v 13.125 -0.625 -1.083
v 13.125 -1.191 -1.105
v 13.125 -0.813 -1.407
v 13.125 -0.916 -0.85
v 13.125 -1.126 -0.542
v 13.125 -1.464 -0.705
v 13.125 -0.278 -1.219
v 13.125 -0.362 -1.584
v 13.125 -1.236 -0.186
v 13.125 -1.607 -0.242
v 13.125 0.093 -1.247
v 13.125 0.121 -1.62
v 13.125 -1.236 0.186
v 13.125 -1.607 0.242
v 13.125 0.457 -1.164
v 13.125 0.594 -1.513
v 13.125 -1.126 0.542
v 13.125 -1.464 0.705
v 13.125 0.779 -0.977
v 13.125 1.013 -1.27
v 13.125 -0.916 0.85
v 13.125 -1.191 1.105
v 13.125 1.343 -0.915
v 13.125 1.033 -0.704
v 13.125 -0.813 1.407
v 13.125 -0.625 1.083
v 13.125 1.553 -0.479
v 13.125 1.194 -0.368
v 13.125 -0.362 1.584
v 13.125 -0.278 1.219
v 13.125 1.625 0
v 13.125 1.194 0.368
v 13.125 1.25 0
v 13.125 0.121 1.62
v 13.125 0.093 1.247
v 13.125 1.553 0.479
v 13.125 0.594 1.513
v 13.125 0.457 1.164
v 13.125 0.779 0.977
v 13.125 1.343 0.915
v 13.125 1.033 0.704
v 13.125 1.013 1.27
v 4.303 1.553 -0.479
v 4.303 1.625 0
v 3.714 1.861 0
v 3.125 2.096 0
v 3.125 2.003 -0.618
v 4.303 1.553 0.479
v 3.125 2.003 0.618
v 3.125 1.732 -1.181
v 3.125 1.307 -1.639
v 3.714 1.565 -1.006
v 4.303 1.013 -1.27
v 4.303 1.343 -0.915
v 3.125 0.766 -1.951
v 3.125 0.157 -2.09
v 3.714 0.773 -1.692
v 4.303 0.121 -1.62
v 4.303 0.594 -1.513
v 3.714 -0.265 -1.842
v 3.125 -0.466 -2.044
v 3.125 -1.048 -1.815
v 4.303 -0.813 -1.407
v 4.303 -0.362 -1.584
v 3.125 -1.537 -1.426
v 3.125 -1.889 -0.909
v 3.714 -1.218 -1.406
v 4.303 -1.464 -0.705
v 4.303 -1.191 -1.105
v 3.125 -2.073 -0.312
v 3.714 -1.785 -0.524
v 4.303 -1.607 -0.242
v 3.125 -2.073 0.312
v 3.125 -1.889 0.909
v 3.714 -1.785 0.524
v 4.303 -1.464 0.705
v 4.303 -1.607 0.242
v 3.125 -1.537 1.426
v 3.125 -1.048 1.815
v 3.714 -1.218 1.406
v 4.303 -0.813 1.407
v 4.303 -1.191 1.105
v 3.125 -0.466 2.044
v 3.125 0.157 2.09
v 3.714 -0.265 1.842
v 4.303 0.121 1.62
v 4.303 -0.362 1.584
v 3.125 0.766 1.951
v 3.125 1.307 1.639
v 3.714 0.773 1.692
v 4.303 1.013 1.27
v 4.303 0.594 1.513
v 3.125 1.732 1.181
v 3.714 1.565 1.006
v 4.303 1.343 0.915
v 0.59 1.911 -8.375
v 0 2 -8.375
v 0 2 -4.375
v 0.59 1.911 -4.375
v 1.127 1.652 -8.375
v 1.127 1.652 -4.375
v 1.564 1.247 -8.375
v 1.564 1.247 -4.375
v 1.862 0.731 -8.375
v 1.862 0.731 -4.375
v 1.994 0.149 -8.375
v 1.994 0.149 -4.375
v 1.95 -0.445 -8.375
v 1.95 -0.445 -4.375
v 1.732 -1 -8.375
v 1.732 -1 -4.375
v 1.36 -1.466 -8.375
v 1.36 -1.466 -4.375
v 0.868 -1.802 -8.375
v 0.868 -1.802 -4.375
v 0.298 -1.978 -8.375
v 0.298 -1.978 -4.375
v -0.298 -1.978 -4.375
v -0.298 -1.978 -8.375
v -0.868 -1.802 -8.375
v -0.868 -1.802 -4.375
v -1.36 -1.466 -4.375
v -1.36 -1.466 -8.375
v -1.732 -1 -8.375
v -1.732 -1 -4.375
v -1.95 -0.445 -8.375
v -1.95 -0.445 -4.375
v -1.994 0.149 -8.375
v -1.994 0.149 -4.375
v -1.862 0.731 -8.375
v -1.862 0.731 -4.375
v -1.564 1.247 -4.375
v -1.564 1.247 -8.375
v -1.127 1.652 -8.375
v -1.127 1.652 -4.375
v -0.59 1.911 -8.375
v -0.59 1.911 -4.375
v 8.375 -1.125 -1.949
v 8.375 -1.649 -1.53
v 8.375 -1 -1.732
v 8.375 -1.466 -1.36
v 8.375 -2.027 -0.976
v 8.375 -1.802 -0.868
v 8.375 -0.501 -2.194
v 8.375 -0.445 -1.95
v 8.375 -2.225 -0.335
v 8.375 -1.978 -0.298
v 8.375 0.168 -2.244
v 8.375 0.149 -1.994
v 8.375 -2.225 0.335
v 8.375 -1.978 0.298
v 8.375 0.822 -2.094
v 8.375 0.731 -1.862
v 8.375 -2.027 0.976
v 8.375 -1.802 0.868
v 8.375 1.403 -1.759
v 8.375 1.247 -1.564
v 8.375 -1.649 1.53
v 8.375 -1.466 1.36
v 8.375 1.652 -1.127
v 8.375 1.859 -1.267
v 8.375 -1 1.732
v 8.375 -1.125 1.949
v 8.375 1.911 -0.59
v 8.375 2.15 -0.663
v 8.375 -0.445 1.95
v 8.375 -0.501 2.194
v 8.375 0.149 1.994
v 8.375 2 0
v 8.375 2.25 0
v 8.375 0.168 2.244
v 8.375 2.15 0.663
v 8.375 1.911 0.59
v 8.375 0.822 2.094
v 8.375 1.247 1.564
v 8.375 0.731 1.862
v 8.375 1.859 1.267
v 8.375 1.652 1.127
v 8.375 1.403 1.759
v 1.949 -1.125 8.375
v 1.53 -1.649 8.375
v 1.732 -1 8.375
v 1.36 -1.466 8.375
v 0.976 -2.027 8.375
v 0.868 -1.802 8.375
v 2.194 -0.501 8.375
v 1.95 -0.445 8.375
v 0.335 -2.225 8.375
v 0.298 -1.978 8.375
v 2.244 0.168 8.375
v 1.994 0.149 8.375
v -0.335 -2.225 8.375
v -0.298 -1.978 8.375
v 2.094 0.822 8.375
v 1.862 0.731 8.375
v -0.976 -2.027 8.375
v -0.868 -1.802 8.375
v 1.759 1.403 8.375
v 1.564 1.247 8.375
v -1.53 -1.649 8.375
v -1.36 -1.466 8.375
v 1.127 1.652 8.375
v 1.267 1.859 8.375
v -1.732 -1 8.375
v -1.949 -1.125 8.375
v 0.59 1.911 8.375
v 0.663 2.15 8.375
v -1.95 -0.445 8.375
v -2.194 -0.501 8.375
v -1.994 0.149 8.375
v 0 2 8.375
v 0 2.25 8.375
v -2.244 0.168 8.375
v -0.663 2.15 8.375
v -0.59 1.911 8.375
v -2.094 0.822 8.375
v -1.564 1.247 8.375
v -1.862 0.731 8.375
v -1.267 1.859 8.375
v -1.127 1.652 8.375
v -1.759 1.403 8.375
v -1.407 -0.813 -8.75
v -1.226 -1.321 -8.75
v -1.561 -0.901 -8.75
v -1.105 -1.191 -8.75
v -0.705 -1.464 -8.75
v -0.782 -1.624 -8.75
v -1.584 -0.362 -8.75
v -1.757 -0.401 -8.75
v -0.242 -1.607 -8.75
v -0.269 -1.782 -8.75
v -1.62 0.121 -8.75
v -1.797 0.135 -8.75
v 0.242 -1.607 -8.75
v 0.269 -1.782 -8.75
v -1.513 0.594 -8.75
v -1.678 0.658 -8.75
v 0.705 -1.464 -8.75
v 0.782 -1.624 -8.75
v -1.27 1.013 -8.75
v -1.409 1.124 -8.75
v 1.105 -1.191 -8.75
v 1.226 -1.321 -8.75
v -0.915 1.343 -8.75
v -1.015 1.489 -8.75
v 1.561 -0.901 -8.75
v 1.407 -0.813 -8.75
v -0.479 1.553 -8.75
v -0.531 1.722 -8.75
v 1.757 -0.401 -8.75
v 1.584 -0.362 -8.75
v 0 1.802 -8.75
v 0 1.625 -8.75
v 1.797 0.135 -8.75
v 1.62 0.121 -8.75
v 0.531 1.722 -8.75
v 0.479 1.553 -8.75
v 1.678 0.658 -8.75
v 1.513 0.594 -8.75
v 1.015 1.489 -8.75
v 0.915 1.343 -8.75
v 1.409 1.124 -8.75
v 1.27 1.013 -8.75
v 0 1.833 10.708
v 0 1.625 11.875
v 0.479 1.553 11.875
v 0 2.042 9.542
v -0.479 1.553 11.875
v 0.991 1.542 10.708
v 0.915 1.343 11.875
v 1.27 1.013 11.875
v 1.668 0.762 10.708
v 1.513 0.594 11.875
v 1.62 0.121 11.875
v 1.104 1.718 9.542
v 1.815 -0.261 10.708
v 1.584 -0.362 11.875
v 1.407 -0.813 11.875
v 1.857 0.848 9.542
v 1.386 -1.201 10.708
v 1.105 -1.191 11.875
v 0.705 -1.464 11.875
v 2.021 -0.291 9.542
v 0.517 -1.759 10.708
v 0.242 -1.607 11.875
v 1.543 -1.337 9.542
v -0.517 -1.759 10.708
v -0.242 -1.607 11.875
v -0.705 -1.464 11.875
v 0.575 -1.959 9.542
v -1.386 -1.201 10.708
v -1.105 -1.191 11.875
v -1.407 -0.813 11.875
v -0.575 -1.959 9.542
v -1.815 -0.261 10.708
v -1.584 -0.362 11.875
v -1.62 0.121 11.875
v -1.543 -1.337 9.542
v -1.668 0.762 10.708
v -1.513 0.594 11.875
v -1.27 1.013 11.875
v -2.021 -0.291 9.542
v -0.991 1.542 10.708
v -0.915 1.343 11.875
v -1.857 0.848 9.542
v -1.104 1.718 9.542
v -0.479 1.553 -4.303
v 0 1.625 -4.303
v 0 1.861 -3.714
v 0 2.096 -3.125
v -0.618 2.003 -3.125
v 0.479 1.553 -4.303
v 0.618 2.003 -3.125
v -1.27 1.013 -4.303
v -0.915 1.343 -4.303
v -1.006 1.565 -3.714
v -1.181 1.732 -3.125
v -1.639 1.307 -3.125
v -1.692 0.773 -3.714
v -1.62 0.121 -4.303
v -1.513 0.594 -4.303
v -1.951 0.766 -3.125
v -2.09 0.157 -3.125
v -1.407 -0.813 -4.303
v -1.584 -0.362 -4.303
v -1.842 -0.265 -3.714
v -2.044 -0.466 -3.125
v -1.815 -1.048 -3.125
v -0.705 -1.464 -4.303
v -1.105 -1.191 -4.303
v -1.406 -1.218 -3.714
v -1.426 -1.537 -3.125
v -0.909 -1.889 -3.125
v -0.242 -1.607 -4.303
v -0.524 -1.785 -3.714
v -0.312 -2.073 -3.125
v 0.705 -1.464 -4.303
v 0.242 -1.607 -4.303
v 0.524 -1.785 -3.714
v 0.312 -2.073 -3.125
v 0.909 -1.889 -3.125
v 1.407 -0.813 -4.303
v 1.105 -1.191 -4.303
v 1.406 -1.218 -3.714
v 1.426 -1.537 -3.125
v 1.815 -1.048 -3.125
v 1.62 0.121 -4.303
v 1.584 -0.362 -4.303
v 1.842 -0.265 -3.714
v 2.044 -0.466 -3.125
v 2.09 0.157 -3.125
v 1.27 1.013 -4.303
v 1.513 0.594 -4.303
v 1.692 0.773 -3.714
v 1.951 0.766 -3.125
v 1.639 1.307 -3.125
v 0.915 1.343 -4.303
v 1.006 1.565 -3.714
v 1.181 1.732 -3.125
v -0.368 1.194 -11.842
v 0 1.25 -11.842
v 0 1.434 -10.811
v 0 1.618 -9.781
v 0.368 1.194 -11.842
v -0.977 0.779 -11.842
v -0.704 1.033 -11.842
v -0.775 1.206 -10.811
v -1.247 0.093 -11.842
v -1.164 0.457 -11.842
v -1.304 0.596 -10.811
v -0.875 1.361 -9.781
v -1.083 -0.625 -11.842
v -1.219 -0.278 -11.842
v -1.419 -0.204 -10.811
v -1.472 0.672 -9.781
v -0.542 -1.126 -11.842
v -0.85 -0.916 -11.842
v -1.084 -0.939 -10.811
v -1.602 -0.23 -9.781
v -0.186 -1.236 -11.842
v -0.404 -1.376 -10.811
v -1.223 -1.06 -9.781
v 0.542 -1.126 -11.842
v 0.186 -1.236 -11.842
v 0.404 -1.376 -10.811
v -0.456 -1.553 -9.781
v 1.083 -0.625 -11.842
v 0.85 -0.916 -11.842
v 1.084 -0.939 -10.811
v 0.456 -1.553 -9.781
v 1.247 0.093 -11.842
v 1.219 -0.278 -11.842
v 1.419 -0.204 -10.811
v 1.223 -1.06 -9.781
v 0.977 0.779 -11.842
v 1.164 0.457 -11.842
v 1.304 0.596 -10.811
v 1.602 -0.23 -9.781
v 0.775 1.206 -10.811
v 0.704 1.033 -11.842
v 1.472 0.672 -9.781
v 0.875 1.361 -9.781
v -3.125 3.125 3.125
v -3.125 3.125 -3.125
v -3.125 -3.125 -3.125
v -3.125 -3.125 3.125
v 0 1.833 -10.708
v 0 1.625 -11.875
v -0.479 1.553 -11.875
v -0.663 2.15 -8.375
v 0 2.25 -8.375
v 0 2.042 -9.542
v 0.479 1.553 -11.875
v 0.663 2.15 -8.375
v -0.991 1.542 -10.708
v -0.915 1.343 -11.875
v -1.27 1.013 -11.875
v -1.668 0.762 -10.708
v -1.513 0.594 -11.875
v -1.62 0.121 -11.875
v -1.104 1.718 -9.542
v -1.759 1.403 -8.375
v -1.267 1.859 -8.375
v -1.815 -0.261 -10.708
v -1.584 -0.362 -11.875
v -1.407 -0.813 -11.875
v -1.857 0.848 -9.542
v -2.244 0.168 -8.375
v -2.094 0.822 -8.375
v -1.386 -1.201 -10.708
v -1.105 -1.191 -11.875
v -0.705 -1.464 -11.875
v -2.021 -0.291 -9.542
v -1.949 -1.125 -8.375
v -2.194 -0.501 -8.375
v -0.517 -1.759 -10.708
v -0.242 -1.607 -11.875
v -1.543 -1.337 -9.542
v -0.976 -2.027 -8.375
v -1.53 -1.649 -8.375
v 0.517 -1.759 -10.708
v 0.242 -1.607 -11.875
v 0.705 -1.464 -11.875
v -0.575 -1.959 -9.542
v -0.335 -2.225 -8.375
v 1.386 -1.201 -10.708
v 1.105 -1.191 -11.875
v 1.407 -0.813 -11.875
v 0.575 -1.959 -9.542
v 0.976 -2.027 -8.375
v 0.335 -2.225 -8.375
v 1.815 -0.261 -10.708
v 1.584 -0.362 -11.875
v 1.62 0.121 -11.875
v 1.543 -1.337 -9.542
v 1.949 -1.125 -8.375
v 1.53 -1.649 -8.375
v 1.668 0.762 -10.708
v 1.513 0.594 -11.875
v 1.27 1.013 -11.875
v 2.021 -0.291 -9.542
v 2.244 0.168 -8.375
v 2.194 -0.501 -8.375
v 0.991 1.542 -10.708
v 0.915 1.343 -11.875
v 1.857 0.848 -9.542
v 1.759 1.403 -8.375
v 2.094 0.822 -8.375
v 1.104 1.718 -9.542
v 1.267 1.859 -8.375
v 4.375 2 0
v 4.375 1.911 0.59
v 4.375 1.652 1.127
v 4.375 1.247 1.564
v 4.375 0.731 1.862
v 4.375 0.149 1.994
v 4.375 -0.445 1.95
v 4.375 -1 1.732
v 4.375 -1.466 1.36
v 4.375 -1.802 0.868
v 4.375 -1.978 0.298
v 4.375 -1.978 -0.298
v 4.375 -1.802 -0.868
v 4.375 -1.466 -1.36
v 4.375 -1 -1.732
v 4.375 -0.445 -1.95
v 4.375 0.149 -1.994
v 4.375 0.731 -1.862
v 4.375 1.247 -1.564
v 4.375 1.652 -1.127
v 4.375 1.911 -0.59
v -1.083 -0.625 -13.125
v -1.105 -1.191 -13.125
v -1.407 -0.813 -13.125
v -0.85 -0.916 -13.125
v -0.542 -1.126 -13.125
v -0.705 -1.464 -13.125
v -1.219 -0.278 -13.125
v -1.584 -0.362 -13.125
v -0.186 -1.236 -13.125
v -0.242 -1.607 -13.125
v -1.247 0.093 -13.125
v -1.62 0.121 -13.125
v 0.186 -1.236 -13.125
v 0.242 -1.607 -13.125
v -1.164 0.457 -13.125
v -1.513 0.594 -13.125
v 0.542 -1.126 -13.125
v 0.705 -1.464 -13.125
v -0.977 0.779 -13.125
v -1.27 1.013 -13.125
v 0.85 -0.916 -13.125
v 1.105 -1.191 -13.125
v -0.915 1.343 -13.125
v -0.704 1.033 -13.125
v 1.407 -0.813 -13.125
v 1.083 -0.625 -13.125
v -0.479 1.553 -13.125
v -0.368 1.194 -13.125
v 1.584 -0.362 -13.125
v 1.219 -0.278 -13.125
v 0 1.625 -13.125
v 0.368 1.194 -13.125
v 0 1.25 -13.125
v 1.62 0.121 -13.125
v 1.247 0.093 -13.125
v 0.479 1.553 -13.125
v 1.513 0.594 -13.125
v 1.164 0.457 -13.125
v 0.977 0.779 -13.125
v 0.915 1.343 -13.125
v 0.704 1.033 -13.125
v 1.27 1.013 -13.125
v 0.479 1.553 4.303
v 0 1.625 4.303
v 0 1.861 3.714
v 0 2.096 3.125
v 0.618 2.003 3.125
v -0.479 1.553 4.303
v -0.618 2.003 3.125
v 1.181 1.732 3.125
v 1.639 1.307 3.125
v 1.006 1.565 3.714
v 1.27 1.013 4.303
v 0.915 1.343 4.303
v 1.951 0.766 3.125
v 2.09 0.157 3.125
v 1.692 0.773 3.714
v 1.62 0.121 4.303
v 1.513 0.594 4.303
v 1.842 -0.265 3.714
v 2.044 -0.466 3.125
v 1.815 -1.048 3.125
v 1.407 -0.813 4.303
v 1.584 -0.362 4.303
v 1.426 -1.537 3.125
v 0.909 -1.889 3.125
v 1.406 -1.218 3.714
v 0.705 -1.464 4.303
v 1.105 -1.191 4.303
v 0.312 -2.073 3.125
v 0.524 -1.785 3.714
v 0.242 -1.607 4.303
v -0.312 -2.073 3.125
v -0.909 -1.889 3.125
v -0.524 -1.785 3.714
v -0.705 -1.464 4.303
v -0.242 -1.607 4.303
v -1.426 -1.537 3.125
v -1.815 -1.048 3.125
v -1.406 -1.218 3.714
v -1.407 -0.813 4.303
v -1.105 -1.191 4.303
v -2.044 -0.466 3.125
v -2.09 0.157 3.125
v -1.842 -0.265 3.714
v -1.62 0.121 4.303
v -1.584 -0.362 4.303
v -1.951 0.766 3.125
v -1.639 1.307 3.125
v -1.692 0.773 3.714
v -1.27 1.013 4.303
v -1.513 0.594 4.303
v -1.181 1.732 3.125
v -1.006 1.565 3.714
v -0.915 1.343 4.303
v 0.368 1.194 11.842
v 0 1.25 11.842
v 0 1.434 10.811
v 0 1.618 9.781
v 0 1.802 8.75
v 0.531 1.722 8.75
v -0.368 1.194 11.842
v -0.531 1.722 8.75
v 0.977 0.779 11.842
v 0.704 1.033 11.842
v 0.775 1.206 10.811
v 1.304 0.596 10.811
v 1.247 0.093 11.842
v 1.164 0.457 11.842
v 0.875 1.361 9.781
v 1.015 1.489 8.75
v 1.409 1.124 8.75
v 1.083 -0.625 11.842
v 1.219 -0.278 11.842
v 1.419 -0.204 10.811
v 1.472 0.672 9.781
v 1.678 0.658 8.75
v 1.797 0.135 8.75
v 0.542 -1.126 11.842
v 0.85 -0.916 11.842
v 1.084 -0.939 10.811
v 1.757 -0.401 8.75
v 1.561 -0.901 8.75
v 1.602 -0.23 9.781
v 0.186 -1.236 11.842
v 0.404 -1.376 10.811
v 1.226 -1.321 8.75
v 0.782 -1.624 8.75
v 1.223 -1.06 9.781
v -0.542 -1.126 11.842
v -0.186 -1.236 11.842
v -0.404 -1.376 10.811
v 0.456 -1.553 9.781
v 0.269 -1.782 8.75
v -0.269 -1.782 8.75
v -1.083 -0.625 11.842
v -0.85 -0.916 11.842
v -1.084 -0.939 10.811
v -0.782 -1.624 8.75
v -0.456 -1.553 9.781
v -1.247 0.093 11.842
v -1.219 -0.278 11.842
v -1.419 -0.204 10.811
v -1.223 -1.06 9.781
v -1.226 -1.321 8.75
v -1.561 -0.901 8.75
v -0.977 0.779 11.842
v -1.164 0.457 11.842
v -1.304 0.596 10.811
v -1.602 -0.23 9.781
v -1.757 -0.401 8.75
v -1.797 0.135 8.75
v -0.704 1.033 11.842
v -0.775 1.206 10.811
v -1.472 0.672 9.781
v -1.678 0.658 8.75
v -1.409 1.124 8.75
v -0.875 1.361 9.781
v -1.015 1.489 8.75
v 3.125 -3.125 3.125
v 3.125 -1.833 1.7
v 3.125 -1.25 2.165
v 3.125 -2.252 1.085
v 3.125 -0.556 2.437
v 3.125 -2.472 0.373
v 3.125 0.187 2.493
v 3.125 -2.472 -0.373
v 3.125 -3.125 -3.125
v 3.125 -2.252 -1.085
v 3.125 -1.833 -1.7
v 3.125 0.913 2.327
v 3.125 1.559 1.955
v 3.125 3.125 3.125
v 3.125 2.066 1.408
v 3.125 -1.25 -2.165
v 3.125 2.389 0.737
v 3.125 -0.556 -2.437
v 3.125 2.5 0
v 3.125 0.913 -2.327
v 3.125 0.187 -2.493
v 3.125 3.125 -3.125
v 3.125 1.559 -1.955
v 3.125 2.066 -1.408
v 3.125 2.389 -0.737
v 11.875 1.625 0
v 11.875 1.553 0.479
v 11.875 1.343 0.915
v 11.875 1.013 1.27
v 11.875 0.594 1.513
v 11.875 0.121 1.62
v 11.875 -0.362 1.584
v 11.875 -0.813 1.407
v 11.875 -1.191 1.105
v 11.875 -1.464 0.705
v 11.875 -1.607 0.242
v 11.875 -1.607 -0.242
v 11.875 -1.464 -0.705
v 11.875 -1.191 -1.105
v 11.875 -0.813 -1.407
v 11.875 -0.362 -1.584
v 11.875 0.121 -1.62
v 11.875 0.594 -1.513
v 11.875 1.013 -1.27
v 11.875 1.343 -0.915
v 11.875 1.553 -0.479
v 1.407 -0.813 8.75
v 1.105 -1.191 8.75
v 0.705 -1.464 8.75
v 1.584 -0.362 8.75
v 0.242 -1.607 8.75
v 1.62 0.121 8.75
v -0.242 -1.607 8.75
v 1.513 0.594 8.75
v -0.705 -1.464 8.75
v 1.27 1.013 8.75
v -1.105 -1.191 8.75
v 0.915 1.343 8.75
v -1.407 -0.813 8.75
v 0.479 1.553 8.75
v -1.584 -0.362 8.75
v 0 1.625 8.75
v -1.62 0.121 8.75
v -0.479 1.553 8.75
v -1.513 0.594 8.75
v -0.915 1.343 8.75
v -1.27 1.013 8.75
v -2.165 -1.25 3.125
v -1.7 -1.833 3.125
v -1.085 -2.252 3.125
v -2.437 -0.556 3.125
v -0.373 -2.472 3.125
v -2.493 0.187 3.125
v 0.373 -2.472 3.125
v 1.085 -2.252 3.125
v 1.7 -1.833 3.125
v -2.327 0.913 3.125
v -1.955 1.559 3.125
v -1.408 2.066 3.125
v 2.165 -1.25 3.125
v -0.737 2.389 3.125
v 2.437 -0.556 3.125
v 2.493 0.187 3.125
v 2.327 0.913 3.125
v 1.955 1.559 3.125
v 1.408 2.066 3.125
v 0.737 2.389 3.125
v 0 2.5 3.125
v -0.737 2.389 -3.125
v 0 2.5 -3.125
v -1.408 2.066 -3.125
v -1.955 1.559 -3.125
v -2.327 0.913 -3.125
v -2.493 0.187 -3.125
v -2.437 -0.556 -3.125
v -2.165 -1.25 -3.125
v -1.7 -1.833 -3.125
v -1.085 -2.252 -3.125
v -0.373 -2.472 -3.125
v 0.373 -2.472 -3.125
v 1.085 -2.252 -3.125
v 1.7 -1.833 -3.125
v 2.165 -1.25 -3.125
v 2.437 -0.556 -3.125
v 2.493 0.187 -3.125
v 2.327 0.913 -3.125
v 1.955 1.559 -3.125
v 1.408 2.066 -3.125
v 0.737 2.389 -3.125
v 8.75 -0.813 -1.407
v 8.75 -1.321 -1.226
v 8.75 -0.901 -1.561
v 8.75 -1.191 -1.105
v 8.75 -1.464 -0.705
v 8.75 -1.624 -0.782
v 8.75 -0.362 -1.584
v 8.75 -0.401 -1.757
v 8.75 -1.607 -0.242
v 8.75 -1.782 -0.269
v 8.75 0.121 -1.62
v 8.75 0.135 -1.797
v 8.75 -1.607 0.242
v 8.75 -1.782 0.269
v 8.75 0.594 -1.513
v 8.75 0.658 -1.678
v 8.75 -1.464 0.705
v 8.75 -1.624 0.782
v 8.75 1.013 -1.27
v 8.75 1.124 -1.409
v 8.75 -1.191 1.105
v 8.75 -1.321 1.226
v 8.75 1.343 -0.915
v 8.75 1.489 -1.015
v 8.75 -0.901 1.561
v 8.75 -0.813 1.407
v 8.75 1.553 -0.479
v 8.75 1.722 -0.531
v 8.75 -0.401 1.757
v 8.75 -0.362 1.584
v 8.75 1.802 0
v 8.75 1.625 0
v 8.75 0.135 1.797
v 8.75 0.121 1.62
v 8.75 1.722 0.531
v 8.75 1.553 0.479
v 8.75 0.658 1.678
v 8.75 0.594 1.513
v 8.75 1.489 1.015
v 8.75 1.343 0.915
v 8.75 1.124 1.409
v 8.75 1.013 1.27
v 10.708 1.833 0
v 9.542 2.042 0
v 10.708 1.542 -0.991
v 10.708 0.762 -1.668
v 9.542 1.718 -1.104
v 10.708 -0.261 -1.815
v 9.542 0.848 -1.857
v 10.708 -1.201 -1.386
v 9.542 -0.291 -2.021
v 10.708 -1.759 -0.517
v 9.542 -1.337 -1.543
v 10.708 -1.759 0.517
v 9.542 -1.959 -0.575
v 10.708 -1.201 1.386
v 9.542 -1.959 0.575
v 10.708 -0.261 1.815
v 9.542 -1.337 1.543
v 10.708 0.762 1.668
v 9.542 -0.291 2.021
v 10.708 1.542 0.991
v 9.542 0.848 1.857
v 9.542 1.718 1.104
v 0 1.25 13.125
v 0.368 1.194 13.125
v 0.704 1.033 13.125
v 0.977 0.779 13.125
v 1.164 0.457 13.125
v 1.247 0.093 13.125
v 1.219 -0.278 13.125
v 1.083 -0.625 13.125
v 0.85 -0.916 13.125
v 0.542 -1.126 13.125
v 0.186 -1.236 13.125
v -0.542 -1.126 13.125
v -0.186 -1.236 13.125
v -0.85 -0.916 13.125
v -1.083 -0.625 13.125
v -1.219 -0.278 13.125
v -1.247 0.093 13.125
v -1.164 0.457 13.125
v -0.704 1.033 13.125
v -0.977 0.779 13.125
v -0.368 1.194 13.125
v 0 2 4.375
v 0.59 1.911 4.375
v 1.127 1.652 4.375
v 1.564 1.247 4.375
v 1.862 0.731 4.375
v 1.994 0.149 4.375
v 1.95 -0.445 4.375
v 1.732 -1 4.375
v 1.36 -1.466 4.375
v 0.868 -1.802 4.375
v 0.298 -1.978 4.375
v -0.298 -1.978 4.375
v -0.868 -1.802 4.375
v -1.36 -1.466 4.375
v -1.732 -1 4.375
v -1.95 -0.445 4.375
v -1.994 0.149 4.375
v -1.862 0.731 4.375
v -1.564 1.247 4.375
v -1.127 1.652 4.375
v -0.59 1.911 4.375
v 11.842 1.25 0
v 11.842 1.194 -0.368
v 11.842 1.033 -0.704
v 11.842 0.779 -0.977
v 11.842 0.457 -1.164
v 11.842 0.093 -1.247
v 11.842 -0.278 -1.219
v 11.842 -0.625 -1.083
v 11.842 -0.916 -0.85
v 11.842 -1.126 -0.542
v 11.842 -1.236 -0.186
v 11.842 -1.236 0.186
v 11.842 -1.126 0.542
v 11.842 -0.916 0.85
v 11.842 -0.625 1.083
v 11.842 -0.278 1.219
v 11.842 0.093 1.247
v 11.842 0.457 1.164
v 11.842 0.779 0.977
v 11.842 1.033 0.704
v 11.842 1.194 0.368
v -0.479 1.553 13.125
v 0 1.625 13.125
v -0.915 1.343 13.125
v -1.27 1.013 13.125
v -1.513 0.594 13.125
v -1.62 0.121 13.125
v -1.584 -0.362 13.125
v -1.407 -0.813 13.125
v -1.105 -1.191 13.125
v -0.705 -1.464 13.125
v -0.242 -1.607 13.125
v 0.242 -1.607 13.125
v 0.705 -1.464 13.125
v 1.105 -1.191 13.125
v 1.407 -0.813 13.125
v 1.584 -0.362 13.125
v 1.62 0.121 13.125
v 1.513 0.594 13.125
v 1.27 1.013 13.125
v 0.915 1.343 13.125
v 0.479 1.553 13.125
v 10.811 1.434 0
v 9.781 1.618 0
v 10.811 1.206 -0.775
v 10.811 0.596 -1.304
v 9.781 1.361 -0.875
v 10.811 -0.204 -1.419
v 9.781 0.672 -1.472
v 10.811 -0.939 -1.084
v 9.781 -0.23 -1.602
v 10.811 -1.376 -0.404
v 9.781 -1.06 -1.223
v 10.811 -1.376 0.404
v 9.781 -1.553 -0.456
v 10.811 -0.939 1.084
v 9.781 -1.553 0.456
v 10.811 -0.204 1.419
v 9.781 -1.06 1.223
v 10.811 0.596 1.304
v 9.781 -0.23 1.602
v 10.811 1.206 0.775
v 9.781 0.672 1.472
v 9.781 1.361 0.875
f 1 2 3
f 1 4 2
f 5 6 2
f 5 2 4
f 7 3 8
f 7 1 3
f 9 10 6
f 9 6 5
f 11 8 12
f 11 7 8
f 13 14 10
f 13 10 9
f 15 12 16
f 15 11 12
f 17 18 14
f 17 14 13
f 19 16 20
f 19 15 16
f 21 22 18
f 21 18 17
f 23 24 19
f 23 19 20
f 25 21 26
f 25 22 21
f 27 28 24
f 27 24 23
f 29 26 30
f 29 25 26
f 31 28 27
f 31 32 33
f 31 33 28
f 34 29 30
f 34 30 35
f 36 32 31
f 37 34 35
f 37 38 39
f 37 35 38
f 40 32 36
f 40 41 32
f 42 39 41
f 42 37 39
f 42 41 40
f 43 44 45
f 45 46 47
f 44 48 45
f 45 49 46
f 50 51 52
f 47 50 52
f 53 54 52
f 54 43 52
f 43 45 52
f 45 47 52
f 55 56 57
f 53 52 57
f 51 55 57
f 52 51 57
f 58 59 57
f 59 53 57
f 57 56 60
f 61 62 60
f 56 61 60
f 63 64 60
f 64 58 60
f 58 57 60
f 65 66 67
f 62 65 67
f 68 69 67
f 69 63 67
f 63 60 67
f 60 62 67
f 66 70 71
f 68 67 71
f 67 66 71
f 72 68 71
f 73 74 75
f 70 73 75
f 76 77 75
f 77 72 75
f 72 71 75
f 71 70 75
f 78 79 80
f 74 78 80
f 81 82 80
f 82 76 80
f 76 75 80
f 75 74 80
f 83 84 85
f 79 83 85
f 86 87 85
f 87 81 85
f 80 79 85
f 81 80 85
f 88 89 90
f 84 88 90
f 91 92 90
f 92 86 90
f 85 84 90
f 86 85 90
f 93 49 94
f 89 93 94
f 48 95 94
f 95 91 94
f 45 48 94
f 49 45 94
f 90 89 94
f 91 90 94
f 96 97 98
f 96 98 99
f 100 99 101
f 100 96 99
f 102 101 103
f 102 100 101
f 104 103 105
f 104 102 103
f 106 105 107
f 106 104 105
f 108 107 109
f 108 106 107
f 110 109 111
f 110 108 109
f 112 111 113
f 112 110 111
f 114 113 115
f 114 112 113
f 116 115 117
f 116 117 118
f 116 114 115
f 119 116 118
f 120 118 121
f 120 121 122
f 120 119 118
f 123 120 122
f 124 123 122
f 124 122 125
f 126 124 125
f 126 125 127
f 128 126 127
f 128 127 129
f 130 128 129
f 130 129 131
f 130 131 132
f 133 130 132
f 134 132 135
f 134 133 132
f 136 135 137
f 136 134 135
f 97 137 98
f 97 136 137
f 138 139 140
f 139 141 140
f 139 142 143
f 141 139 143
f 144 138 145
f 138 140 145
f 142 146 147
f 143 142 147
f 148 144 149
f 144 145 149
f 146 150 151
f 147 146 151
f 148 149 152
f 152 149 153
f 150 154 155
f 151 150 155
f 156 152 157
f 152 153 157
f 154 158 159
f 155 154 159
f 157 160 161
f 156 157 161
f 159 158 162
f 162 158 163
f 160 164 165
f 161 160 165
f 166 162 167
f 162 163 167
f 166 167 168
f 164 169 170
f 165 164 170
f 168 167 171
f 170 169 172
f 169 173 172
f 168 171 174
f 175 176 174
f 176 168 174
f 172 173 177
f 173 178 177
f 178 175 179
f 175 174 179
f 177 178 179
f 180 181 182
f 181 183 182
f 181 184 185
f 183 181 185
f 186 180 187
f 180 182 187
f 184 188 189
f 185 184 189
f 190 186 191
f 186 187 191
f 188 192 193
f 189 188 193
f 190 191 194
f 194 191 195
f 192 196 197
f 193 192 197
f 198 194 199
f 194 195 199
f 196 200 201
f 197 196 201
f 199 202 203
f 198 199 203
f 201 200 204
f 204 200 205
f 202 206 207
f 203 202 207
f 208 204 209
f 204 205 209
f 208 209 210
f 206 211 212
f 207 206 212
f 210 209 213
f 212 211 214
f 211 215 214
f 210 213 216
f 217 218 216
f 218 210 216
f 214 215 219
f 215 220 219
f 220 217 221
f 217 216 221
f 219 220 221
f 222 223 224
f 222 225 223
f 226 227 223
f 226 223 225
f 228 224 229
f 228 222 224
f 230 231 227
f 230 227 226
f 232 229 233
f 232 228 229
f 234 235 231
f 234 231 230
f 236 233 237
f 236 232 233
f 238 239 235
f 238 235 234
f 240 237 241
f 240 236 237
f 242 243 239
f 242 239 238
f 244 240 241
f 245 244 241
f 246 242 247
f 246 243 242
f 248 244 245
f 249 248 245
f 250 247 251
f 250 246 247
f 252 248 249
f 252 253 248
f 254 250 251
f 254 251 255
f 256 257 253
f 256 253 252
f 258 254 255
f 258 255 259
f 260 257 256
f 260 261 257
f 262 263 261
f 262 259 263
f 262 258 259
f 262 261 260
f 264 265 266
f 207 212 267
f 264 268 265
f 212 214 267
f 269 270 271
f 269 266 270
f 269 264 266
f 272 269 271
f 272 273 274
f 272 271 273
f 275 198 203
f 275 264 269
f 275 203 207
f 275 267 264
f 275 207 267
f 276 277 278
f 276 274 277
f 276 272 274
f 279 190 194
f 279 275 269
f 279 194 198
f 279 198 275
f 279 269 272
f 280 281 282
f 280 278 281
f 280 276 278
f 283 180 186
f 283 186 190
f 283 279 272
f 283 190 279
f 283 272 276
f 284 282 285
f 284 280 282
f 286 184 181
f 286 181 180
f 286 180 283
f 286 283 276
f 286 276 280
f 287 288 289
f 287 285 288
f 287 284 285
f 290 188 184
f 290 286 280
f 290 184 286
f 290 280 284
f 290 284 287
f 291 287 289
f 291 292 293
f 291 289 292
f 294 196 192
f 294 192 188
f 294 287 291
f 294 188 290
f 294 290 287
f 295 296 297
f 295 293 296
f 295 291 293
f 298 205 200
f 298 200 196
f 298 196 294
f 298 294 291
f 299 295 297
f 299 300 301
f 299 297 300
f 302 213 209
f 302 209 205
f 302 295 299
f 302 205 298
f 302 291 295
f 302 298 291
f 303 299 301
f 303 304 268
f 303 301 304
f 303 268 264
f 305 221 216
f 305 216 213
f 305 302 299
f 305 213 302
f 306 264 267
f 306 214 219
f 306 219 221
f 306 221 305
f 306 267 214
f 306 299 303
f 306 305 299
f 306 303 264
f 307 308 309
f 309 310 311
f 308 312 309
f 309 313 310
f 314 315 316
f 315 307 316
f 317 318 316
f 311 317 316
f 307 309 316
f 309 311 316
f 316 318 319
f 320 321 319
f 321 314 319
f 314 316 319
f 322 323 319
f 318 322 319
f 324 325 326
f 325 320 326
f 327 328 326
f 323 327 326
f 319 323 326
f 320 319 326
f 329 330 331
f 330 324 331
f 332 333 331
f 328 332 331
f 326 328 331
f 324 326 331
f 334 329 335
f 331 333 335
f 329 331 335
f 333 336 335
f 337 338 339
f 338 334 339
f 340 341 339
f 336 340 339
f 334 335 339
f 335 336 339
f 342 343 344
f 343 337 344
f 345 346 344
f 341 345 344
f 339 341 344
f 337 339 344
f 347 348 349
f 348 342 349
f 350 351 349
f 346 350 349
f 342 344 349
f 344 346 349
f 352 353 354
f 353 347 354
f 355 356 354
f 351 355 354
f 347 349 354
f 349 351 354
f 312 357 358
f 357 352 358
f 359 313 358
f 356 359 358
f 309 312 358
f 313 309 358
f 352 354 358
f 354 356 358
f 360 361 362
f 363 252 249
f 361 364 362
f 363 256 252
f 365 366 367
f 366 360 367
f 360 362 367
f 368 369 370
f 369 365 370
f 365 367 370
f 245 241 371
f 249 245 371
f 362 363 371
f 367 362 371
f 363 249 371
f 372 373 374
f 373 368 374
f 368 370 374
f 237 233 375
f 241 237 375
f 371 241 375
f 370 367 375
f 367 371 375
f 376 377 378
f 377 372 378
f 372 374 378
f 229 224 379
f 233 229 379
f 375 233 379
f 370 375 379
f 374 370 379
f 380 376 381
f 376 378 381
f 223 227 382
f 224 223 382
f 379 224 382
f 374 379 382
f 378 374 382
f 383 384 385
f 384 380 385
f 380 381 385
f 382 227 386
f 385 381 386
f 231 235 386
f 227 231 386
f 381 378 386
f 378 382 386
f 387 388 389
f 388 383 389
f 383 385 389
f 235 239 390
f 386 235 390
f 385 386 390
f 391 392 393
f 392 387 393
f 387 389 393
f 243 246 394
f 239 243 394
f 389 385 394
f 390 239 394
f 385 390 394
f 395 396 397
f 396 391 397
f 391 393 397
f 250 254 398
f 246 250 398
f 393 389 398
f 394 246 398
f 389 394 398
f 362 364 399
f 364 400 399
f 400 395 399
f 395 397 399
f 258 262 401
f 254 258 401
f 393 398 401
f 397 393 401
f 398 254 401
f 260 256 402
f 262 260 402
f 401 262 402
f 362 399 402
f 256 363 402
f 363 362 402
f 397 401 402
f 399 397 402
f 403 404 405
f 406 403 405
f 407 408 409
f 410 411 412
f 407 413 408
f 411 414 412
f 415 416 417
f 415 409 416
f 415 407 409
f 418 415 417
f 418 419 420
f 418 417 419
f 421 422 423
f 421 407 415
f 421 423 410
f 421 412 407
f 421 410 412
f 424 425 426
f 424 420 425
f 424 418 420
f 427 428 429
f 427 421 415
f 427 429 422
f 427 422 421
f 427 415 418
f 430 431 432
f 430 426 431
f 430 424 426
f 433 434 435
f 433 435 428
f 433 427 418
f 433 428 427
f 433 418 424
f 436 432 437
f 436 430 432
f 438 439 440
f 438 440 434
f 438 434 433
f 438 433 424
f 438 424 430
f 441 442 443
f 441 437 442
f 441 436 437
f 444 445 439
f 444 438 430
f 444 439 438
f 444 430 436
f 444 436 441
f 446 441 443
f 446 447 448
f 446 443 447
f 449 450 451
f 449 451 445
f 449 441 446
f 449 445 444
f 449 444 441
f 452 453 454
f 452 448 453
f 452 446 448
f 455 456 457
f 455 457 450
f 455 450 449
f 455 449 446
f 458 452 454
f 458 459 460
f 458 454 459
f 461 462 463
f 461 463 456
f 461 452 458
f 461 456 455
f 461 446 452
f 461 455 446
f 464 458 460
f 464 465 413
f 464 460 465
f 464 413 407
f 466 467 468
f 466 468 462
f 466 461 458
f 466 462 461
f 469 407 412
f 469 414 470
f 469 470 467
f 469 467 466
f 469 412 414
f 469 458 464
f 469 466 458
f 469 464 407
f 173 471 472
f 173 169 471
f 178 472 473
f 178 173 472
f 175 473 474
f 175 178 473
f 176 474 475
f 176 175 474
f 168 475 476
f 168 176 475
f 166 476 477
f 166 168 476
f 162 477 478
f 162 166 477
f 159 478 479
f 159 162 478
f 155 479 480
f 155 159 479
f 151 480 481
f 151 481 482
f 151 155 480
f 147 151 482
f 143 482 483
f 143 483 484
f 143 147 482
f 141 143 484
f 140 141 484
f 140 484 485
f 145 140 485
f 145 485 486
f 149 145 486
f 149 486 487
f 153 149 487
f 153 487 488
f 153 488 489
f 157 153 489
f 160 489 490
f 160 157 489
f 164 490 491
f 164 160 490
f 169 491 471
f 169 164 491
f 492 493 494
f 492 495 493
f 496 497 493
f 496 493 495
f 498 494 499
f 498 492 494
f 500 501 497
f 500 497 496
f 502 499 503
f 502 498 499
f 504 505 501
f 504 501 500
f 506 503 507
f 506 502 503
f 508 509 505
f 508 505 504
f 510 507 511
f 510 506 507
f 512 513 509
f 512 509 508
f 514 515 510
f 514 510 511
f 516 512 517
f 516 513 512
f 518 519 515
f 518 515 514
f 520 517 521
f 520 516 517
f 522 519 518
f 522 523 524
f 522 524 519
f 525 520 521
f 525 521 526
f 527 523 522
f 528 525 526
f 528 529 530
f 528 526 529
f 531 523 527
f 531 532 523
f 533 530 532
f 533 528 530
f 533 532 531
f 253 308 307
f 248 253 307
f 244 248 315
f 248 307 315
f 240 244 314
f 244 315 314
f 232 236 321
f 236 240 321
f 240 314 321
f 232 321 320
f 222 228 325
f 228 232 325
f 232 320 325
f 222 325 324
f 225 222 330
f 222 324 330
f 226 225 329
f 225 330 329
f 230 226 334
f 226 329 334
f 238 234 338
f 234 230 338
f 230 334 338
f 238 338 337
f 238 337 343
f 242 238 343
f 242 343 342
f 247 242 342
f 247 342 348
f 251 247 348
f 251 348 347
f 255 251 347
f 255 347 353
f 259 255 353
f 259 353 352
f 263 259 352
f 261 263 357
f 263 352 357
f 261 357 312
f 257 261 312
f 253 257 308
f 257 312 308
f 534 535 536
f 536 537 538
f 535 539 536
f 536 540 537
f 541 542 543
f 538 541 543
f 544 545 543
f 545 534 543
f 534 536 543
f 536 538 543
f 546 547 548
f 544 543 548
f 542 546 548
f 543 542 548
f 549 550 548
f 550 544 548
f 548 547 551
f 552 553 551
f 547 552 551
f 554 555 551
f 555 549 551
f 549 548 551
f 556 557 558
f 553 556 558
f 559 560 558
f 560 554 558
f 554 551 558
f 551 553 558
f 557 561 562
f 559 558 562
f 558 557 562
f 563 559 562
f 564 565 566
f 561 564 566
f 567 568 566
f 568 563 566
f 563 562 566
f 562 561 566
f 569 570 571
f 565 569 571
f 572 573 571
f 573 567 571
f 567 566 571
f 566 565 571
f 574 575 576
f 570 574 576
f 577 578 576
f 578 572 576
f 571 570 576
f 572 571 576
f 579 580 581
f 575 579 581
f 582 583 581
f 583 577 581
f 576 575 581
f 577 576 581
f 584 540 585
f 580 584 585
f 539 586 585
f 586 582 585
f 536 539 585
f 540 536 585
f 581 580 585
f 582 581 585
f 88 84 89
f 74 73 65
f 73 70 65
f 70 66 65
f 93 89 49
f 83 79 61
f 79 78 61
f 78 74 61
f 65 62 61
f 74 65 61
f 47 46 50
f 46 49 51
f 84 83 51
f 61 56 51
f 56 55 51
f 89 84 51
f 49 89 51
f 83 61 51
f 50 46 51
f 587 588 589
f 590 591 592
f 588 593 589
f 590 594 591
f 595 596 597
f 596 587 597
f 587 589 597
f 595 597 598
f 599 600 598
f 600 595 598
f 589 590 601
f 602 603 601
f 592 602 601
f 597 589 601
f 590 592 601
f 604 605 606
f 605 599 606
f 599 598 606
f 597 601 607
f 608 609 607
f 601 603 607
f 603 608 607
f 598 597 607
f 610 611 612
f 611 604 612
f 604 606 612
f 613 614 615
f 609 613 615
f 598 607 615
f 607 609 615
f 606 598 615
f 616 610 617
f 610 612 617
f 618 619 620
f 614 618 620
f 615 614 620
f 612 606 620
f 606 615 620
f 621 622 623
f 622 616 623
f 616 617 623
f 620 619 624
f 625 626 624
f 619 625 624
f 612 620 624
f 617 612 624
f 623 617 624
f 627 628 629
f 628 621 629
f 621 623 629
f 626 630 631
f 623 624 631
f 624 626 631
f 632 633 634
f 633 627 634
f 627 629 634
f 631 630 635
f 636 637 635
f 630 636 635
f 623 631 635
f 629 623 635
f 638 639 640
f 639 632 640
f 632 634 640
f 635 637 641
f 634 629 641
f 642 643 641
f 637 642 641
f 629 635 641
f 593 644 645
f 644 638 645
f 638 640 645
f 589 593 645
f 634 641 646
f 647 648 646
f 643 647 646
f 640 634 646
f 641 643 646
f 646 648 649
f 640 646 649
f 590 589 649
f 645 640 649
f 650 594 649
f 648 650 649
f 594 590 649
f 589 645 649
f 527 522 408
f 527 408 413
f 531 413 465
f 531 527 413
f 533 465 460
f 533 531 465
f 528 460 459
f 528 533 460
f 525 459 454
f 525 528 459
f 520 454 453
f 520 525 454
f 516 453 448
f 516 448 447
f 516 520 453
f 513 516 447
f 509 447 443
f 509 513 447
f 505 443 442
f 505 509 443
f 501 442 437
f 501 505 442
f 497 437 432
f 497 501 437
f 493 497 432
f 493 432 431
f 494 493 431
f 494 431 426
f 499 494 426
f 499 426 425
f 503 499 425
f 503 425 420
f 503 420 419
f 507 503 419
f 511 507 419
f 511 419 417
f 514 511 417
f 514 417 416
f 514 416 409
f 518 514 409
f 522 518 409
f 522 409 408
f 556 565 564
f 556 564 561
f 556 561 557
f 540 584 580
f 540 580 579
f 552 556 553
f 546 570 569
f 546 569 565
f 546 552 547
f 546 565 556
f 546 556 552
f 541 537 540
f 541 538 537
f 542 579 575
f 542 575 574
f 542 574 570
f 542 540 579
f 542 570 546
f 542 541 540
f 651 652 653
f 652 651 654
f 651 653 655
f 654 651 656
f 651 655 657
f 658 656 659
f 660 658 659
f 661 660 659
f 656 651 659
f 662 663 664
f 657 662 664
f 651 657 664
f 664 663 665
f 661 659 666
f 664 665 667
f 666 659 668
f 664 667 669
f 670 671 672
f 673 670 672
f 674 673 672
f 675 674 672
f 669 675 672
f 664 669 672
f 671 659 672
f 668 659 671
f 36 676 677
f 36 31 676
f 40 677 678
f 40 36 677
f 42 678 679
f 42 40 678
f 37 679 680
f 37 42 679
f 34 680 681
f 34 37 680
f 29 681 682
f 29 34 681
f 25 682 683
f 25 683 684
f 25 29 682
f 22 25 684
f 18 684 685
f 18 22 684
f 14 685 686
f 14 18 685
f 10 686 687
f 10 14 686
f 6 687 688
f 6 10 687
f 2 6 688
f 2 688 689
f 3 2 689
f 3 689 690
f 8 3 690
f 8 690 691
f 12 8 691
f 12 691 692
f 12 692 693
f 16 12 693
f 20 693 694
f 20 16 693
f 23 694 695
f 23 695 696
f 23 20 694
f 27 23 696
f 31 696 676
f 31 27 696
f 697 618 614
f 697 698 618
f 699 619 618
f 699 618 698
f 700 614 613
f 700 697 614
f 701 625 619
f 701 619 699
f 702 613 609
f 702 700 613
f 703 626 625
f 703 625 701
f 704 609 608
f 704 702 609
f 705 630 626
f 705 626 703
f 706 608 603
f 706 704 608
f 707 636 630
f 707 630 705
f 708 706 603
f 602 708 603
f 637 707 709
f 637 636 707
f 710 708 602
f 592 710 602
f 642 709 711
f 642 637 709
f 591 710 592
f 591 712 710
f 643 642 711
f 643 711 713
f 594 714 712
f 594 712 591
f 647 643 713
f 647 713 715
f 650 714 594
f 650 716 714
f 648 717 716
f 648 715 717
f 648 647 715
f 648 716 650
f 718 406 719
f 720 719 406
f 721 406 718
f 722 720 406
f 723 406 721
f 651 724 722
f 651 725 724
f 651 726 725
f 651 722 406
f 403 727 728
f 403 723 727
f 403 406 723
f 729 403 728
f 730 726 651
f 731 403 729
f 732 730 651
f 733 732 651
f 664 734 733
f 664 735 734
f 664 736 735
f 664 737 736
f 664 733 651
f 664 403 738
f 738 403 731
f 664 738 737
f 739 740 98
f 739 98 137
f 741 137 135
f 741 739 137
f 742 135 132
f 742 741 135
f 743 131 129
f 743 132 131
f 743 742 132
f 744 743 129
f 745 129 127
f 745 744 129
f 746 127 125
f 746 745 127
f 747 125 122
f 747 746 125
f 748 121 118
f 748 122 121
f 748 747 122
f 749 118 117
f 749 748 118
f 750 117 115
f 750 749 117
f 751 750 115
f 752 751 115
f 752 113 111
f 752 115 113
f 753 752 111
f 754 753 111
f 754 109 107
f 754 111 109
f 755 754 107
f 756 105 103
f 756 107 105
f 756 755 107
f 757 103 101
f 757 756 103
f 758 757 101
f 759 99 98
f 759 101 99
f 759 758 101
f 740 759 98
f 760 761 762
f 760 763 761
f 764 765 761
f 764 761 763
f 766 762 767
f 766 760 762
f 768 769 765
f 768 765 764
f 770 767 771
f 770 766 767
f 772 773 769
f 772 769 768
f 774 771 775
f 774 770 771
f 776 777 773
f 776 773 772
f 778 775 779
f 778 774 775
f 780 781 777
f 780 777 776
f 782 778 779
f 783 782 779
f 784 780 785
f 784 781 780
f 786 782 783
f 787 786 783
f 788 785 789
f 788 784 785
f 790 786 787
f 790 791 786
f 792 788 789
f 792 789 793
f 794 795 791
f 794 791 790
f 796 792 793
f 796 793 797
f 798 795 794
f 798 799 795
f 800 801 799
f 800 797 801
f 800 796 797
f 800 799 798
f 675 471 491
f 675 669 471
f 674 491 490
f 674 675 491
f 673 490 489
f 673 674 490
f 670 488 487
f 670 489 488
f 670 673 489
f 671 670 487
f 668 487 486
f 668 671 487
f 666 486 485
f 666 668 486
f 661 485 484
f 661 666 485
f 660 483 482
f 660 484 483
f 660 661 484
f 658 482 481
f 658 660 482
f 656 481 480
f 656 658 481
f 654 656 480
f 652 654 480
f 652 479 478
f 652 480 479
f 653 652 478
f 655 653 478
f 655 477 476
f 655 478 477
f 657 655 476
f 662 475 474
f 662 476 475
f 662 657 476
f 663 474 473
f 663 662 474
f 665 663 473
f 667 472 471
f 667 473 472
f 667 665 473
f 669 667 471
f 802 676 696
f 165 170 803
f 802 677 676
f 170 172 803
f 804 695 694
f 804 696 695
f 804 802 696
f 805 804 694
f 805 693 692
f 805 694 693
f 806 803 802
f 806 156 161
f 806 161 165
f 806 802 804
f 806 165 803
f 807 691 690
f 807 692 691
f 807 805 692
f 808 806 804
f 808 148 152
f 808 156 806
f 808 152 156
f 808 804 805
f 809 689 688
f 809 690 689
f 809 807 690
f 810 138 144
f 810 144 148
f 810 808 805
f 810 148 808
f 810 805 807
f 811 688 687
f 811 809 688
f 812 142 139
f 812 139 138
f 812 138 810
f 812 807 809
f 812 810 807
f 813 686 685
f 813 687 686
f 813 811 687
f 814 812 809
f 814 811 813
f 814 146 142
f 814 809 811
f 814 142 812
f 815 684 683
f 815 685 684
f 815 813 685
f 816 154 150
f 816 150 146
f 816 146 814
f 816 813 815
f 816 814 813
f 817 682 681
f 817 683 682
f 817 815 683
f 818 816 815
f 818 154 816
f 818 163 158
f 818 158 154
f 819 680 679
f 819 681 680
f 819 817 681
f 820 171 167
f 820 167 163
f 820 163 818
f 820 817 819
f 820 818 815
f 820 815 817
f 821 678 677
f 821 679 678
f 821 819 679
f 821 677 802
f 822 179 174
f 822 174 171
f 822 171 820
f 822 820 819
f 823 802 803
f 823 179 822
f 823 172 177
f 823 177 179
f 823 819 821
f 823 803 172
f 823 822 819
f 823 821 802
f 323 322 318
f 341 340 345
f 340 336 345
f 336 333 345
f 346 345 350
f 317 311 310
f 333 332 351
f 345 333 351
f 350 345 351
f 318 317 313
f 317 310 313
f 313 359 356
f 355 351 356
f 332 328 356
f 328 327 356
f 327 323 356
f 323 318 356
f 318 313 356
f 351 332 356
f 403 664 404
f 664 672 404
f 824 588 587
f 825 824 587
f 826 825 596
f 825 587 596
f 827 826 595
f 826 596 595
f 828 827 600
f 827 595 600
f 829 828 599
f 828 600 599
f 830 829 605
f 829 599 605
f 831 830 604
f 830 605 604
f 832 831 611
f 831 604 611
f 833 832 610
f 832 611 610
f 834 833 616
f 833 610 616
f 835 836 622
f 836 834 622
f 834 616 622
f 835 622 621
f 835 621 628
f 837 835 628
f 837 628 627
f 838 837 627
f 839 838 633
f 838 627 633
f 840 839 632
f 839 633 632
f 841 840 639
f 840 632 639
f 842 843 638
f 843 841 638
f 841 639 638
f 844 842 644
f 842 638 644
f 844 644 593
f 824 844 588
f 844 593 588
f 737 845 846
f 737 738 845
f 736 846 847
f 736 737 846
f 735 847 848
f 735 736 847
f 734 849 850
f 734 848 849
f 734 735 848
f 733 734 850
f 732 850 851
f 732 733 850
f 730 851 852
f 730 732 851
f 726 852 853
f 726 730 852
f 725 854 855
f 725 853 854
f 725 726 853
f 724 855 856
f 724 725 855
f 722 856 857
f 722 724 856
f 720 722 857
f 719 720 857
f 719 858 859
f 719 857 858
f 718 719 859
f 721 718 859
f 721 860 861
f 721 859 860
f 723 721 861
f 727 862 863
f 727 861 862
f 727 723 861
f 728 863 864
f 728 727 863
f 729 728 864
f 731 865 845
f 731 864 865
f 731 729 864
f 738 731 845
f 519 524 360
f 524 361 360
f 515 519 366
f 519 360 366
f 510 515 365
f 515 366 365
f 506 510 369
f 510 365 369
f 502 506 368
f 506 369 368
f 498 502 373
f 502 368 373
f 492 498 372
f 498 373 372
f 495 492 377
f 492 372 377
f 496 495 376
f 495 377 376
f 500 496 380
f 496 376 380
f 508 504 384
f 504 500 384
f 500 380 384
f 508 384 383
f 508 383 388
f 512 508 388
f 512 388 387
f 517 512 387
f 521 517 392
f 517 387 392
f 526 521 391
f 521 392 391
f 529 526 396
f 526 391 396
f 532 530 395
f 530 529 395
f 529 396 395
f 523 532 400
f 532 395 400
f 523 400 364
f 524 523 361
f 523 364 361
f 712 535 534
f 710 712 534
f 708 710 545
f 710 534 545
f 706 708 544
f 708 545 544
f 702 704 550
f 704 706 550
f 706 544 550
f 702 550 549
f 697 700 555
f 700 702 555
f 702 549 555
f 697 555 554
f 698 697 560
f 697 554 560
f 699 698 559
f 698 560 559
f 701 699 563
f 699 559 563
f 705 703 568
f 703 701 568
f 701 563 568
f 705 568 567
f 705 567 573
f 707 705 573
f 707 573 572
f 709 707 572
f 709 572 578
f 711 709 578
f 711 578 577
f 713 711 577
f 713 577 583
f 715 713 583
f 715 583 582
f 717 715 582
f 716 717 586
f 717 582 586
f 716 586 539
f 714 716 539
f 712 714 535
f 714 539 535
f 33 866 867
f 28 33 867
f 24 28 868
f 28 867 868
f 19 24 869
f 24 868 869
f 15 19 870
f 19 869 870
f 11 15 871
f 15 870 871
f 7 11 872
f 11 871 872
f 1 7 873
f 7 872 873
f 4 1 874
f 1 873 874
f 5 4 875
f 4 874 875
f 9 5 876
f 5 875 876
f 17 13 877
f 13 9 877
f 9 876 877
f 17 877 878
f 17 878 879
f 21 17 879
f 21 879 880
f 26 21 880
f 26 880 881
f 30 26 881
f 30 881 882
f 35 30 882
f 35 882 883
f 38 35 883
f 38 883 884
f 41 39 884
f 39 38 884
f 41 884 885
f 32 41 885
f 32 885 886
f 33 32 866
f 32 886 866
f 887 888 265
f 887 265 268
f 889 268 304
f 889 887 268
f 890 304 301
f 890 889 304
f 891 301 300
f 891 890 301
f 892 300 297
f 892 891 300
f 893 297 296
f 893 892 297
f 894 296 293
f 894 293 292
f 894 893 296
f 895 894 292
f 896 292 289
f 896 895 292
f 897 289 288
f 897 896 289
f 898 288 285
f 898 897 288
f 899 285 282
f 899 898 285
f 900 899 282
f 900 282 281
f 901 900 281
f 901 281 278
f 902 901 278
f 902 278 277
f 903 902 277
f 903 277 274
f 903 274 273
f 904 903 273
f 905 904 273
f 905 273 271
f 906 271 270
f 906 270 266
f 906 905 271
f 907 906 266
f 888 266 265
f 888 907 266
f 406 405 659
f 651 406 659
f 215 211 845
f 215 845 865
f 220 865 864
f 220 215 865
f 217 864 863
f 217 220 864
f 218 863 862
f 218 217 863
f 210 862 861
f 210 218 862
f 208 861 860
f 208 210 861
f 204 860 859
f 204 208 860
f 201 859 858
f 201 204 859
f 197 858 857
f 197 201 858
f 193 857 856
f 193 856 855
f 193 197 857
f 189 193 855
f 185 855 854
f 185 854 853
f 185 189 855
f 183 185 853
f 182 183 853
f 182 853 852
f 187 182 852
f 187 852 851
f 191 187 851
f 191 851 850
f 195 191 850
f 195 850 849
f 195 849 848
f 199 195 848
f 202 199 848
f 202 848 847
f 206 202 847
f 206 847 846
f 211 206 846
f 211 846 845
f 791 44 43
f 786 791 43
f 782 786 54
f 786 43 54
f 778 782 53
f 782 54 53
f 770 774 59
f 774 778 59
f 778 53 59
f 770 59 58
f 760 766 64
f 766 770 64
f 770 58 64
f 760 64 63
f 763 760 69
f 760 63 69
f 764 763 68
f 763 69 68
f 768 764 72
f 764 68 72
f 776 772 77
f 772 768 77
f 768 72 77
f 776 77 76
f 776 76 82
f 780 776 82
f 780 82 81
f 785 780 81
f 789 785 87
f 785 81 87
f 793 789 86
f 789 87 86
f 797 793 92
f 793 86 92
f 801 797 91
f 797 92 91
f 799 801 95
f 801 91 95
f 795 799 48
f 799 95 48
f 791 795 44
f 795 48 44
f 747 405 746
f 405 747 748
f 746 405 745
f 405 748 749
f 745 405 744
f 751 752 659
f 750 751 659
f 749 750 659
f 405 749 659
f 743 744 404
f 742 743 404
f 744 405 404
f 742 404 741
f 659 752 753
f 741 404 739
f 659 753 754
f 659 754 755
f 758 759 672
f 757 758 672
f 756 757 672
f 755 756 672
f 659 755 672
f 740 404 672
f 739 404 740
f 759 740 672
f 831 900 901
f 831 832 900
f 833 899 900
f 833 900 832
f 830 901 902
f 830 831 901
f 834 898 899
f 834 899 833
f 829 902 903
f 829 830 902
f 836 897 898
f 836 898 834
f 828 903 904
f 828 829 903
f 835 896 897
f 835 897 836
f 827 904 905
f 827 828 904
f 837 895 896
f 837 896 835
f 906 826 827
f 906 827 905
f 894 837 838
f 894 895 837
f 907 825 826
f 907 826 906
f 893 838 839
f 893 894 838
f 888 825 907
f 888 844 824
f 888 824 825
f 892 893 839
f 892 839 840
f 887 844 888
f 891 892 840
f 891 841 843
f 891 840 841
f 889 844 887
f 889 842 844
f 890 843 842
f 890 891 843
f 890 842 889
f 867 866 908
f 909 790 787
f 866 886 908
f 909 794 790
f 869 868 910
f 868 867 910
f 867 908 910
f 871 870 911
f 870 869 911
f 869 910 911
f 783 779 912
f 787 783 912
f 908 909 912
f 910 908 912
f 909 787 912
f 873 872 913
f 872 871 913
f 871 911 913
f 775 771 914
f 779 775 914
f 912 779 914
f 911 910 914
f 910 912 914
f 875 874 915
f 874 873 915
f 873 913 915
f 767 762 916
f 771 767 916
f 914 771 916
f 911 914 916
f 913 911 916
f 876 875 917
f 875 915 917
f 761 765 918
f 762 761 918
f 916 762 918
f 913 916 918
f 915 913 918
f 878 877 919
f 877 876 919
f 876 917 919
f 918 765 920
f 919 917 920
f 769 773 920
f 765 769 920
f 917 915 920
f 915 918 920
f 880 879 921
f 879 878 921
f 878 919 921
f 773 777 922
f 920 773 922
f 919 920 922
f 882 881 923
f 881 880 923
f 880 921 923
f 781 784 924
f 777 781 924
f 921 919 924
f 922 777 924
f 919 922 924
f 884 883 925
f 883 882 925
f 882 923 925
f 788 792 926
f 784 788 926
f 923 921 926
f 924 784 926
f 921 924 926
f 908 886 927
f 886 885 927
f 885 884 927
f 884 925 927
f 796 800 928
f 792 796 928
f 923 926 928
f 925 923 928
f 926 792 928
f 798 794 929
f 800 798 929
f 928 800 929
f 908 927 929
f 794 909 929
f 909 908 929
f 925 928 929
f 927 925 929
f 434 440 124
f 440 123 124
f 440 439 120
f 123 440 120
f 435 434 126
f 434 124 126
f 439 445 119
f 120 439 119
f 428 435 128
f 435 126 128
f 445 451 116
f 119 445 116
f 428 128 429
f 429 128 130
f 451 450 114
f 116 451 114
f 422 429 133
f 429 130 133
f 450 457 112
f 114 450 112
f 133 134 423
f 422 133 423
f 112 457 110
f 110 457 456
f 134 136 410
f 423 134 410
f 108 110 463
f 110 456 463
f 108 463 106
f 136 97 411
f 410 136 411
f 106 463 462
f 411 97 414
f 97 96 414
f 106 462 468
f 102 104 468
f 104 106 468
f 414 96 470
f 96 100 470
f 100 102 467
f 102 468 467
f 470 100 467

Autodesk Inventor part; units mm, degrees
ref_plane "YZ Plane" through (0, 0, 0) normal (1, 0, 0) x (0, 1, 0)
ref_plane "XZ Plane" through (0, 0, 0) normal (0, 1, 0) x (-1, 0, 0)
ref_plane "XY Plane" through (0, 0, 0) normal (0, 0, 1) x (1, 0, 0)
sketch "Sketch1" plane through (0, 0, 0) normal (0, 0, 1) x (1, 0, 0)
  line L0 (-3.125, -3.125) -> (3.125, -3.125)
  line L1 (3.125, -3.125) -> (3.125, 3.125)
  line L2 (3.125, 3.125) -> (-3.125, 3.125)
  line L3 (-3.125, 3.125) -> (-3.125, -3.125)
  line L4 (-3.125, -3.125) -> (3.125, 3.125) construction
  line L5 (3.125, -3.125) -> (-3.125, 3.125) construction
  point P0 (0, 0)
  dimension "d0" = 6.25
  dimension "d1" = 6.25
extrude "Extrusion1" add sketch "Sketch1" along normal mid plane 6.25
sketch "Sketch2" plane through (0, 0, 0) normal (1, 0, 0) x (0, 1, 0)
  line L0 (-3.125, 3.125) -> (3.125, 3.125) projected
  line L1 (2, 4.375) -> (2, 8.375)
  line L2 (2, 8.375) -> (2.25, 8.375)
  line L3 (2.25, 8.375) -> (1.625, 11.875)
  line L4 (0, 0) -> (0, 14.1963) construction
  line L5 (1.625, 11.875) -> (1.625, 13.125)
  line L6 (2, 4.375) -> (2.5, 3.125)
  line L7 (1.25, 13.125) -> (1.25, 11.8418)
  line L8 (1.25, 11.8418) -> (1.8021, 8.75)
  line L9 (1.8021, 8.75) -> (1.625, 8.75)
  line L10 (1.625, 8.75) -> (1.625, 4.3028)
  line L11 (1.625, 4.3028) -> (2.1518, 2.9857)
  line L12 (1.625, 13.125) -> (1.25, 13.125)
  point P0 (2.0961, 3.125)
  dimension "d4" = 4
  dimension "d5" = 4.5
  dimension "d6" = 3.25
  dimension "d7" = 10
  dimension "d8" = 1.25
  dimension "d9" = 3.5
  dimension "d11" = 5
  dimension "d12" = 1.25
  dimension "d13" = 2.5
revolve "Revolution1" add sketch "Sketch2" angle 360 about axis through (0, 0, 0) along (0, 0, 1)
pattern_circular "Circular Pattern1" count 3 over 180 about axis through (0, -10, 0) along (0, 1, 0) of "Revolution1"
equation "\"d2\" = d1"
properties part number "Adafruit_4662"
